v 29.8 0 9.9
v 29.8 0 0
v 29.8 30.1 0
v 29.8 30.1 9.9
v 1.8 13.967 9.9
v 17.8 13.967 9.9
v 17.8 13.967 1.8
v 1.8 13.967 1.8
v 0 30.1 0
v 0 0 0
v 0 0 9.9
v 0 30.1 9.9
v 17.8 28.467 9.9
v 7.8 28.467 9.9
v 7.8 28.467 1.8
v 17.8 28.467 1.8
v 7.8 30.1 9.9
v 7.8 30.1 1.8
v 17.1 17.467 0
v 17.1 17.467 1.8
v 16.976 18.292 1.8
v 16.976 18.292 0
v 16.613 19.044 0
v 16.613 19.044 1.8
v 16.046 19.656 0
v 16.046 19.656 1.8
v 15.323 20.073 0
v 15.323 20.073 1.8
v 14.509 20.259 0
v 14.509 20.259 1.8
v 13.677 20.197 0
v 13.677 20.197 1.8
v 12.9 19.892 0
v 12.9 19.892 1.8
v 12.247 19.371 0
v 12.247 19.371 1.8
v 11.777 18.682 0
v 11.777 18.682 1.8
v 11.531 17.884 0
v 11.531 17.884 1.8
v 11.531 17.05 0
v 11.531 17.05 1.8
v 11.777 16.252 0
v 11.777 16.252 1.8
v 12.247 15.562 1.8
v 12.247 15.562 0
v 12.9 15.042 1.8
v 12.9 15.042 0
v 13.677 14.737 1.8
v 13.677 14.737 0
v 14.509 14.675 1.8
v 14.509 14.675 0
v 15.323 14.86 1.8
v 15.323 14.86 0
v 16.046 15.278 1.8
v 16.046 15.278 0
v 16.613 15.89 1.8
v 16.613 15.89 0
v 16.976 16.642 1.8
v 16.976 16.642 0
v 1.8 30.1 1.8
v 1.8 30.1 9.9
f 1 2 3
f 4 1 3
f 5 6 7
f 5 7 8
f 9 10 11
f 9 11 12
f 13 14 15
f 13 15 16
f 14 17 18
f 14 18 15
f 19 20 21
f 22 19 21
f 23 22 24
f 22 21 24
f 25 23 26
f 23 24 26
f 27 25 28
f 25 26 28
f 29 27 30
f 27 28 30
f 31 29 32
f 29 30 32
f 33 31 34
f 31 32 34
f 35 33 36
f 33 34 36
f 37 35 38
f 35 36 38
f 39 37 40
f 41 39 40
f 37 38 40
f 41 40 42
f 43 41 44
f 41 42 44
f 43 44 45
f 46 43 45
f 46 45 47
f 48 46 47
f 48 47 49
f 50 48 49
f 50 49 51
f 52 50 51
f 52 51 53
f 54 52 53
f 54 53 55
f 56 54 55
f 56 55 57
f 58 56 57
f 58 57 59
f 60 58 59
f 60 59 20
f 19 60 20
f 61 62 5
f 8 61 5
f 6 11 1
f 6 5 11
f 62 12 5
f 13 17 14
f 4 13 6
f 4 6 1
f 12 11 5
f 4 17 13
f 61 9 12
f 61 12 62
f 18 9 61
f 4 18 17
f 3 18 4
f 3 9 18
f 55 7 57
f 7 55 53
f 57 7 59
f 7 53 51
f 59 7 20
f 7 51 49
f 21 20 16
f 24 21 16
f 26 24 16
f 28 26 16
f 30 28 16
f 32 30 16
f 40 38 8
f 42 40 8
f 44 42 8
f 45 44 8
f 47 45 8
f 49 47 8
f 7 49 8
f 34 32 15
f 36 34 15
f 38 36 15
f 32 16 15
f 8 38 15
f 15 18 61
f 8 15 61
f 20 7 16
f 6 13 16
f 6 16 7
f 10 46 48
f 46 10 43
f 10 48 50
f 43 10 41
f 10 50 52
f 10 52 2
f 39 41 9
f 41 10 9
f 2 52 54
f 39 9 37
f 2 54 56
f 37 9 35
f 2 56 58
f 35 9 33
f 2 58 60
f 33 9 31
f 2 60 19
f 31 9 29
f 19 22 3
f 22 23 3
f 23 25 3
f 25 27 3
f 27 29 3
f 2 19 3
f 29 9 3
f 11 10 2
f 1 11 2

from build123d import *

# Parameters (mm, degrees)
SKETCH1_W           = 29.8
SKETCH1_H           = 30.1
BOSS_EXTRUDE1_DEPTH = 9.9
CUT_EXTRUDE1_DEPTH  = 8.1
SKETCH3_R           = 2.8
CUT_EXTRUDE2_DEPTH  = 44.123775345


with BuildPart() as part:
    # Sketch1 → Boss-Extrude1 (new body)
    with BuildSketch(Plane.XY):
        with Locations((14.9, 15.05)):
            Rectangle(SKETCH1_W, SKETCH1_H)
    extrude(amount=BOSS_EXTRUDE1_DEPTH)

    # Sketch2 → Cut-Extrude1 (cut)
    with BuildSketch(Plane.XY.offset(9.9)):
        Polygon((7.8, 30.1), (7.8, 28.466915374), (17.8, 28.466915374), (17.8, 13.966915374), (1.8, 13.966915374), (1.8, 28.466915374), (1.8, 30.1), align=None)
    extrude(amount=-CUT_EXTRUDE1_DEPTH, mode=Mode.SUBTRACT)

    # Sketch3 → Cut-Extrude2 (cut, through all)
    with BuildSketch(Plane.XY.offset(1.8)):
        with Locations((14.3, 17.466915374)):
            Circle(SKETCH3_R)
    extrude(amount=-CUT_EXTRUDE2_DEPTH, mode=Mode.SUBTRACT)


solid = part.part
